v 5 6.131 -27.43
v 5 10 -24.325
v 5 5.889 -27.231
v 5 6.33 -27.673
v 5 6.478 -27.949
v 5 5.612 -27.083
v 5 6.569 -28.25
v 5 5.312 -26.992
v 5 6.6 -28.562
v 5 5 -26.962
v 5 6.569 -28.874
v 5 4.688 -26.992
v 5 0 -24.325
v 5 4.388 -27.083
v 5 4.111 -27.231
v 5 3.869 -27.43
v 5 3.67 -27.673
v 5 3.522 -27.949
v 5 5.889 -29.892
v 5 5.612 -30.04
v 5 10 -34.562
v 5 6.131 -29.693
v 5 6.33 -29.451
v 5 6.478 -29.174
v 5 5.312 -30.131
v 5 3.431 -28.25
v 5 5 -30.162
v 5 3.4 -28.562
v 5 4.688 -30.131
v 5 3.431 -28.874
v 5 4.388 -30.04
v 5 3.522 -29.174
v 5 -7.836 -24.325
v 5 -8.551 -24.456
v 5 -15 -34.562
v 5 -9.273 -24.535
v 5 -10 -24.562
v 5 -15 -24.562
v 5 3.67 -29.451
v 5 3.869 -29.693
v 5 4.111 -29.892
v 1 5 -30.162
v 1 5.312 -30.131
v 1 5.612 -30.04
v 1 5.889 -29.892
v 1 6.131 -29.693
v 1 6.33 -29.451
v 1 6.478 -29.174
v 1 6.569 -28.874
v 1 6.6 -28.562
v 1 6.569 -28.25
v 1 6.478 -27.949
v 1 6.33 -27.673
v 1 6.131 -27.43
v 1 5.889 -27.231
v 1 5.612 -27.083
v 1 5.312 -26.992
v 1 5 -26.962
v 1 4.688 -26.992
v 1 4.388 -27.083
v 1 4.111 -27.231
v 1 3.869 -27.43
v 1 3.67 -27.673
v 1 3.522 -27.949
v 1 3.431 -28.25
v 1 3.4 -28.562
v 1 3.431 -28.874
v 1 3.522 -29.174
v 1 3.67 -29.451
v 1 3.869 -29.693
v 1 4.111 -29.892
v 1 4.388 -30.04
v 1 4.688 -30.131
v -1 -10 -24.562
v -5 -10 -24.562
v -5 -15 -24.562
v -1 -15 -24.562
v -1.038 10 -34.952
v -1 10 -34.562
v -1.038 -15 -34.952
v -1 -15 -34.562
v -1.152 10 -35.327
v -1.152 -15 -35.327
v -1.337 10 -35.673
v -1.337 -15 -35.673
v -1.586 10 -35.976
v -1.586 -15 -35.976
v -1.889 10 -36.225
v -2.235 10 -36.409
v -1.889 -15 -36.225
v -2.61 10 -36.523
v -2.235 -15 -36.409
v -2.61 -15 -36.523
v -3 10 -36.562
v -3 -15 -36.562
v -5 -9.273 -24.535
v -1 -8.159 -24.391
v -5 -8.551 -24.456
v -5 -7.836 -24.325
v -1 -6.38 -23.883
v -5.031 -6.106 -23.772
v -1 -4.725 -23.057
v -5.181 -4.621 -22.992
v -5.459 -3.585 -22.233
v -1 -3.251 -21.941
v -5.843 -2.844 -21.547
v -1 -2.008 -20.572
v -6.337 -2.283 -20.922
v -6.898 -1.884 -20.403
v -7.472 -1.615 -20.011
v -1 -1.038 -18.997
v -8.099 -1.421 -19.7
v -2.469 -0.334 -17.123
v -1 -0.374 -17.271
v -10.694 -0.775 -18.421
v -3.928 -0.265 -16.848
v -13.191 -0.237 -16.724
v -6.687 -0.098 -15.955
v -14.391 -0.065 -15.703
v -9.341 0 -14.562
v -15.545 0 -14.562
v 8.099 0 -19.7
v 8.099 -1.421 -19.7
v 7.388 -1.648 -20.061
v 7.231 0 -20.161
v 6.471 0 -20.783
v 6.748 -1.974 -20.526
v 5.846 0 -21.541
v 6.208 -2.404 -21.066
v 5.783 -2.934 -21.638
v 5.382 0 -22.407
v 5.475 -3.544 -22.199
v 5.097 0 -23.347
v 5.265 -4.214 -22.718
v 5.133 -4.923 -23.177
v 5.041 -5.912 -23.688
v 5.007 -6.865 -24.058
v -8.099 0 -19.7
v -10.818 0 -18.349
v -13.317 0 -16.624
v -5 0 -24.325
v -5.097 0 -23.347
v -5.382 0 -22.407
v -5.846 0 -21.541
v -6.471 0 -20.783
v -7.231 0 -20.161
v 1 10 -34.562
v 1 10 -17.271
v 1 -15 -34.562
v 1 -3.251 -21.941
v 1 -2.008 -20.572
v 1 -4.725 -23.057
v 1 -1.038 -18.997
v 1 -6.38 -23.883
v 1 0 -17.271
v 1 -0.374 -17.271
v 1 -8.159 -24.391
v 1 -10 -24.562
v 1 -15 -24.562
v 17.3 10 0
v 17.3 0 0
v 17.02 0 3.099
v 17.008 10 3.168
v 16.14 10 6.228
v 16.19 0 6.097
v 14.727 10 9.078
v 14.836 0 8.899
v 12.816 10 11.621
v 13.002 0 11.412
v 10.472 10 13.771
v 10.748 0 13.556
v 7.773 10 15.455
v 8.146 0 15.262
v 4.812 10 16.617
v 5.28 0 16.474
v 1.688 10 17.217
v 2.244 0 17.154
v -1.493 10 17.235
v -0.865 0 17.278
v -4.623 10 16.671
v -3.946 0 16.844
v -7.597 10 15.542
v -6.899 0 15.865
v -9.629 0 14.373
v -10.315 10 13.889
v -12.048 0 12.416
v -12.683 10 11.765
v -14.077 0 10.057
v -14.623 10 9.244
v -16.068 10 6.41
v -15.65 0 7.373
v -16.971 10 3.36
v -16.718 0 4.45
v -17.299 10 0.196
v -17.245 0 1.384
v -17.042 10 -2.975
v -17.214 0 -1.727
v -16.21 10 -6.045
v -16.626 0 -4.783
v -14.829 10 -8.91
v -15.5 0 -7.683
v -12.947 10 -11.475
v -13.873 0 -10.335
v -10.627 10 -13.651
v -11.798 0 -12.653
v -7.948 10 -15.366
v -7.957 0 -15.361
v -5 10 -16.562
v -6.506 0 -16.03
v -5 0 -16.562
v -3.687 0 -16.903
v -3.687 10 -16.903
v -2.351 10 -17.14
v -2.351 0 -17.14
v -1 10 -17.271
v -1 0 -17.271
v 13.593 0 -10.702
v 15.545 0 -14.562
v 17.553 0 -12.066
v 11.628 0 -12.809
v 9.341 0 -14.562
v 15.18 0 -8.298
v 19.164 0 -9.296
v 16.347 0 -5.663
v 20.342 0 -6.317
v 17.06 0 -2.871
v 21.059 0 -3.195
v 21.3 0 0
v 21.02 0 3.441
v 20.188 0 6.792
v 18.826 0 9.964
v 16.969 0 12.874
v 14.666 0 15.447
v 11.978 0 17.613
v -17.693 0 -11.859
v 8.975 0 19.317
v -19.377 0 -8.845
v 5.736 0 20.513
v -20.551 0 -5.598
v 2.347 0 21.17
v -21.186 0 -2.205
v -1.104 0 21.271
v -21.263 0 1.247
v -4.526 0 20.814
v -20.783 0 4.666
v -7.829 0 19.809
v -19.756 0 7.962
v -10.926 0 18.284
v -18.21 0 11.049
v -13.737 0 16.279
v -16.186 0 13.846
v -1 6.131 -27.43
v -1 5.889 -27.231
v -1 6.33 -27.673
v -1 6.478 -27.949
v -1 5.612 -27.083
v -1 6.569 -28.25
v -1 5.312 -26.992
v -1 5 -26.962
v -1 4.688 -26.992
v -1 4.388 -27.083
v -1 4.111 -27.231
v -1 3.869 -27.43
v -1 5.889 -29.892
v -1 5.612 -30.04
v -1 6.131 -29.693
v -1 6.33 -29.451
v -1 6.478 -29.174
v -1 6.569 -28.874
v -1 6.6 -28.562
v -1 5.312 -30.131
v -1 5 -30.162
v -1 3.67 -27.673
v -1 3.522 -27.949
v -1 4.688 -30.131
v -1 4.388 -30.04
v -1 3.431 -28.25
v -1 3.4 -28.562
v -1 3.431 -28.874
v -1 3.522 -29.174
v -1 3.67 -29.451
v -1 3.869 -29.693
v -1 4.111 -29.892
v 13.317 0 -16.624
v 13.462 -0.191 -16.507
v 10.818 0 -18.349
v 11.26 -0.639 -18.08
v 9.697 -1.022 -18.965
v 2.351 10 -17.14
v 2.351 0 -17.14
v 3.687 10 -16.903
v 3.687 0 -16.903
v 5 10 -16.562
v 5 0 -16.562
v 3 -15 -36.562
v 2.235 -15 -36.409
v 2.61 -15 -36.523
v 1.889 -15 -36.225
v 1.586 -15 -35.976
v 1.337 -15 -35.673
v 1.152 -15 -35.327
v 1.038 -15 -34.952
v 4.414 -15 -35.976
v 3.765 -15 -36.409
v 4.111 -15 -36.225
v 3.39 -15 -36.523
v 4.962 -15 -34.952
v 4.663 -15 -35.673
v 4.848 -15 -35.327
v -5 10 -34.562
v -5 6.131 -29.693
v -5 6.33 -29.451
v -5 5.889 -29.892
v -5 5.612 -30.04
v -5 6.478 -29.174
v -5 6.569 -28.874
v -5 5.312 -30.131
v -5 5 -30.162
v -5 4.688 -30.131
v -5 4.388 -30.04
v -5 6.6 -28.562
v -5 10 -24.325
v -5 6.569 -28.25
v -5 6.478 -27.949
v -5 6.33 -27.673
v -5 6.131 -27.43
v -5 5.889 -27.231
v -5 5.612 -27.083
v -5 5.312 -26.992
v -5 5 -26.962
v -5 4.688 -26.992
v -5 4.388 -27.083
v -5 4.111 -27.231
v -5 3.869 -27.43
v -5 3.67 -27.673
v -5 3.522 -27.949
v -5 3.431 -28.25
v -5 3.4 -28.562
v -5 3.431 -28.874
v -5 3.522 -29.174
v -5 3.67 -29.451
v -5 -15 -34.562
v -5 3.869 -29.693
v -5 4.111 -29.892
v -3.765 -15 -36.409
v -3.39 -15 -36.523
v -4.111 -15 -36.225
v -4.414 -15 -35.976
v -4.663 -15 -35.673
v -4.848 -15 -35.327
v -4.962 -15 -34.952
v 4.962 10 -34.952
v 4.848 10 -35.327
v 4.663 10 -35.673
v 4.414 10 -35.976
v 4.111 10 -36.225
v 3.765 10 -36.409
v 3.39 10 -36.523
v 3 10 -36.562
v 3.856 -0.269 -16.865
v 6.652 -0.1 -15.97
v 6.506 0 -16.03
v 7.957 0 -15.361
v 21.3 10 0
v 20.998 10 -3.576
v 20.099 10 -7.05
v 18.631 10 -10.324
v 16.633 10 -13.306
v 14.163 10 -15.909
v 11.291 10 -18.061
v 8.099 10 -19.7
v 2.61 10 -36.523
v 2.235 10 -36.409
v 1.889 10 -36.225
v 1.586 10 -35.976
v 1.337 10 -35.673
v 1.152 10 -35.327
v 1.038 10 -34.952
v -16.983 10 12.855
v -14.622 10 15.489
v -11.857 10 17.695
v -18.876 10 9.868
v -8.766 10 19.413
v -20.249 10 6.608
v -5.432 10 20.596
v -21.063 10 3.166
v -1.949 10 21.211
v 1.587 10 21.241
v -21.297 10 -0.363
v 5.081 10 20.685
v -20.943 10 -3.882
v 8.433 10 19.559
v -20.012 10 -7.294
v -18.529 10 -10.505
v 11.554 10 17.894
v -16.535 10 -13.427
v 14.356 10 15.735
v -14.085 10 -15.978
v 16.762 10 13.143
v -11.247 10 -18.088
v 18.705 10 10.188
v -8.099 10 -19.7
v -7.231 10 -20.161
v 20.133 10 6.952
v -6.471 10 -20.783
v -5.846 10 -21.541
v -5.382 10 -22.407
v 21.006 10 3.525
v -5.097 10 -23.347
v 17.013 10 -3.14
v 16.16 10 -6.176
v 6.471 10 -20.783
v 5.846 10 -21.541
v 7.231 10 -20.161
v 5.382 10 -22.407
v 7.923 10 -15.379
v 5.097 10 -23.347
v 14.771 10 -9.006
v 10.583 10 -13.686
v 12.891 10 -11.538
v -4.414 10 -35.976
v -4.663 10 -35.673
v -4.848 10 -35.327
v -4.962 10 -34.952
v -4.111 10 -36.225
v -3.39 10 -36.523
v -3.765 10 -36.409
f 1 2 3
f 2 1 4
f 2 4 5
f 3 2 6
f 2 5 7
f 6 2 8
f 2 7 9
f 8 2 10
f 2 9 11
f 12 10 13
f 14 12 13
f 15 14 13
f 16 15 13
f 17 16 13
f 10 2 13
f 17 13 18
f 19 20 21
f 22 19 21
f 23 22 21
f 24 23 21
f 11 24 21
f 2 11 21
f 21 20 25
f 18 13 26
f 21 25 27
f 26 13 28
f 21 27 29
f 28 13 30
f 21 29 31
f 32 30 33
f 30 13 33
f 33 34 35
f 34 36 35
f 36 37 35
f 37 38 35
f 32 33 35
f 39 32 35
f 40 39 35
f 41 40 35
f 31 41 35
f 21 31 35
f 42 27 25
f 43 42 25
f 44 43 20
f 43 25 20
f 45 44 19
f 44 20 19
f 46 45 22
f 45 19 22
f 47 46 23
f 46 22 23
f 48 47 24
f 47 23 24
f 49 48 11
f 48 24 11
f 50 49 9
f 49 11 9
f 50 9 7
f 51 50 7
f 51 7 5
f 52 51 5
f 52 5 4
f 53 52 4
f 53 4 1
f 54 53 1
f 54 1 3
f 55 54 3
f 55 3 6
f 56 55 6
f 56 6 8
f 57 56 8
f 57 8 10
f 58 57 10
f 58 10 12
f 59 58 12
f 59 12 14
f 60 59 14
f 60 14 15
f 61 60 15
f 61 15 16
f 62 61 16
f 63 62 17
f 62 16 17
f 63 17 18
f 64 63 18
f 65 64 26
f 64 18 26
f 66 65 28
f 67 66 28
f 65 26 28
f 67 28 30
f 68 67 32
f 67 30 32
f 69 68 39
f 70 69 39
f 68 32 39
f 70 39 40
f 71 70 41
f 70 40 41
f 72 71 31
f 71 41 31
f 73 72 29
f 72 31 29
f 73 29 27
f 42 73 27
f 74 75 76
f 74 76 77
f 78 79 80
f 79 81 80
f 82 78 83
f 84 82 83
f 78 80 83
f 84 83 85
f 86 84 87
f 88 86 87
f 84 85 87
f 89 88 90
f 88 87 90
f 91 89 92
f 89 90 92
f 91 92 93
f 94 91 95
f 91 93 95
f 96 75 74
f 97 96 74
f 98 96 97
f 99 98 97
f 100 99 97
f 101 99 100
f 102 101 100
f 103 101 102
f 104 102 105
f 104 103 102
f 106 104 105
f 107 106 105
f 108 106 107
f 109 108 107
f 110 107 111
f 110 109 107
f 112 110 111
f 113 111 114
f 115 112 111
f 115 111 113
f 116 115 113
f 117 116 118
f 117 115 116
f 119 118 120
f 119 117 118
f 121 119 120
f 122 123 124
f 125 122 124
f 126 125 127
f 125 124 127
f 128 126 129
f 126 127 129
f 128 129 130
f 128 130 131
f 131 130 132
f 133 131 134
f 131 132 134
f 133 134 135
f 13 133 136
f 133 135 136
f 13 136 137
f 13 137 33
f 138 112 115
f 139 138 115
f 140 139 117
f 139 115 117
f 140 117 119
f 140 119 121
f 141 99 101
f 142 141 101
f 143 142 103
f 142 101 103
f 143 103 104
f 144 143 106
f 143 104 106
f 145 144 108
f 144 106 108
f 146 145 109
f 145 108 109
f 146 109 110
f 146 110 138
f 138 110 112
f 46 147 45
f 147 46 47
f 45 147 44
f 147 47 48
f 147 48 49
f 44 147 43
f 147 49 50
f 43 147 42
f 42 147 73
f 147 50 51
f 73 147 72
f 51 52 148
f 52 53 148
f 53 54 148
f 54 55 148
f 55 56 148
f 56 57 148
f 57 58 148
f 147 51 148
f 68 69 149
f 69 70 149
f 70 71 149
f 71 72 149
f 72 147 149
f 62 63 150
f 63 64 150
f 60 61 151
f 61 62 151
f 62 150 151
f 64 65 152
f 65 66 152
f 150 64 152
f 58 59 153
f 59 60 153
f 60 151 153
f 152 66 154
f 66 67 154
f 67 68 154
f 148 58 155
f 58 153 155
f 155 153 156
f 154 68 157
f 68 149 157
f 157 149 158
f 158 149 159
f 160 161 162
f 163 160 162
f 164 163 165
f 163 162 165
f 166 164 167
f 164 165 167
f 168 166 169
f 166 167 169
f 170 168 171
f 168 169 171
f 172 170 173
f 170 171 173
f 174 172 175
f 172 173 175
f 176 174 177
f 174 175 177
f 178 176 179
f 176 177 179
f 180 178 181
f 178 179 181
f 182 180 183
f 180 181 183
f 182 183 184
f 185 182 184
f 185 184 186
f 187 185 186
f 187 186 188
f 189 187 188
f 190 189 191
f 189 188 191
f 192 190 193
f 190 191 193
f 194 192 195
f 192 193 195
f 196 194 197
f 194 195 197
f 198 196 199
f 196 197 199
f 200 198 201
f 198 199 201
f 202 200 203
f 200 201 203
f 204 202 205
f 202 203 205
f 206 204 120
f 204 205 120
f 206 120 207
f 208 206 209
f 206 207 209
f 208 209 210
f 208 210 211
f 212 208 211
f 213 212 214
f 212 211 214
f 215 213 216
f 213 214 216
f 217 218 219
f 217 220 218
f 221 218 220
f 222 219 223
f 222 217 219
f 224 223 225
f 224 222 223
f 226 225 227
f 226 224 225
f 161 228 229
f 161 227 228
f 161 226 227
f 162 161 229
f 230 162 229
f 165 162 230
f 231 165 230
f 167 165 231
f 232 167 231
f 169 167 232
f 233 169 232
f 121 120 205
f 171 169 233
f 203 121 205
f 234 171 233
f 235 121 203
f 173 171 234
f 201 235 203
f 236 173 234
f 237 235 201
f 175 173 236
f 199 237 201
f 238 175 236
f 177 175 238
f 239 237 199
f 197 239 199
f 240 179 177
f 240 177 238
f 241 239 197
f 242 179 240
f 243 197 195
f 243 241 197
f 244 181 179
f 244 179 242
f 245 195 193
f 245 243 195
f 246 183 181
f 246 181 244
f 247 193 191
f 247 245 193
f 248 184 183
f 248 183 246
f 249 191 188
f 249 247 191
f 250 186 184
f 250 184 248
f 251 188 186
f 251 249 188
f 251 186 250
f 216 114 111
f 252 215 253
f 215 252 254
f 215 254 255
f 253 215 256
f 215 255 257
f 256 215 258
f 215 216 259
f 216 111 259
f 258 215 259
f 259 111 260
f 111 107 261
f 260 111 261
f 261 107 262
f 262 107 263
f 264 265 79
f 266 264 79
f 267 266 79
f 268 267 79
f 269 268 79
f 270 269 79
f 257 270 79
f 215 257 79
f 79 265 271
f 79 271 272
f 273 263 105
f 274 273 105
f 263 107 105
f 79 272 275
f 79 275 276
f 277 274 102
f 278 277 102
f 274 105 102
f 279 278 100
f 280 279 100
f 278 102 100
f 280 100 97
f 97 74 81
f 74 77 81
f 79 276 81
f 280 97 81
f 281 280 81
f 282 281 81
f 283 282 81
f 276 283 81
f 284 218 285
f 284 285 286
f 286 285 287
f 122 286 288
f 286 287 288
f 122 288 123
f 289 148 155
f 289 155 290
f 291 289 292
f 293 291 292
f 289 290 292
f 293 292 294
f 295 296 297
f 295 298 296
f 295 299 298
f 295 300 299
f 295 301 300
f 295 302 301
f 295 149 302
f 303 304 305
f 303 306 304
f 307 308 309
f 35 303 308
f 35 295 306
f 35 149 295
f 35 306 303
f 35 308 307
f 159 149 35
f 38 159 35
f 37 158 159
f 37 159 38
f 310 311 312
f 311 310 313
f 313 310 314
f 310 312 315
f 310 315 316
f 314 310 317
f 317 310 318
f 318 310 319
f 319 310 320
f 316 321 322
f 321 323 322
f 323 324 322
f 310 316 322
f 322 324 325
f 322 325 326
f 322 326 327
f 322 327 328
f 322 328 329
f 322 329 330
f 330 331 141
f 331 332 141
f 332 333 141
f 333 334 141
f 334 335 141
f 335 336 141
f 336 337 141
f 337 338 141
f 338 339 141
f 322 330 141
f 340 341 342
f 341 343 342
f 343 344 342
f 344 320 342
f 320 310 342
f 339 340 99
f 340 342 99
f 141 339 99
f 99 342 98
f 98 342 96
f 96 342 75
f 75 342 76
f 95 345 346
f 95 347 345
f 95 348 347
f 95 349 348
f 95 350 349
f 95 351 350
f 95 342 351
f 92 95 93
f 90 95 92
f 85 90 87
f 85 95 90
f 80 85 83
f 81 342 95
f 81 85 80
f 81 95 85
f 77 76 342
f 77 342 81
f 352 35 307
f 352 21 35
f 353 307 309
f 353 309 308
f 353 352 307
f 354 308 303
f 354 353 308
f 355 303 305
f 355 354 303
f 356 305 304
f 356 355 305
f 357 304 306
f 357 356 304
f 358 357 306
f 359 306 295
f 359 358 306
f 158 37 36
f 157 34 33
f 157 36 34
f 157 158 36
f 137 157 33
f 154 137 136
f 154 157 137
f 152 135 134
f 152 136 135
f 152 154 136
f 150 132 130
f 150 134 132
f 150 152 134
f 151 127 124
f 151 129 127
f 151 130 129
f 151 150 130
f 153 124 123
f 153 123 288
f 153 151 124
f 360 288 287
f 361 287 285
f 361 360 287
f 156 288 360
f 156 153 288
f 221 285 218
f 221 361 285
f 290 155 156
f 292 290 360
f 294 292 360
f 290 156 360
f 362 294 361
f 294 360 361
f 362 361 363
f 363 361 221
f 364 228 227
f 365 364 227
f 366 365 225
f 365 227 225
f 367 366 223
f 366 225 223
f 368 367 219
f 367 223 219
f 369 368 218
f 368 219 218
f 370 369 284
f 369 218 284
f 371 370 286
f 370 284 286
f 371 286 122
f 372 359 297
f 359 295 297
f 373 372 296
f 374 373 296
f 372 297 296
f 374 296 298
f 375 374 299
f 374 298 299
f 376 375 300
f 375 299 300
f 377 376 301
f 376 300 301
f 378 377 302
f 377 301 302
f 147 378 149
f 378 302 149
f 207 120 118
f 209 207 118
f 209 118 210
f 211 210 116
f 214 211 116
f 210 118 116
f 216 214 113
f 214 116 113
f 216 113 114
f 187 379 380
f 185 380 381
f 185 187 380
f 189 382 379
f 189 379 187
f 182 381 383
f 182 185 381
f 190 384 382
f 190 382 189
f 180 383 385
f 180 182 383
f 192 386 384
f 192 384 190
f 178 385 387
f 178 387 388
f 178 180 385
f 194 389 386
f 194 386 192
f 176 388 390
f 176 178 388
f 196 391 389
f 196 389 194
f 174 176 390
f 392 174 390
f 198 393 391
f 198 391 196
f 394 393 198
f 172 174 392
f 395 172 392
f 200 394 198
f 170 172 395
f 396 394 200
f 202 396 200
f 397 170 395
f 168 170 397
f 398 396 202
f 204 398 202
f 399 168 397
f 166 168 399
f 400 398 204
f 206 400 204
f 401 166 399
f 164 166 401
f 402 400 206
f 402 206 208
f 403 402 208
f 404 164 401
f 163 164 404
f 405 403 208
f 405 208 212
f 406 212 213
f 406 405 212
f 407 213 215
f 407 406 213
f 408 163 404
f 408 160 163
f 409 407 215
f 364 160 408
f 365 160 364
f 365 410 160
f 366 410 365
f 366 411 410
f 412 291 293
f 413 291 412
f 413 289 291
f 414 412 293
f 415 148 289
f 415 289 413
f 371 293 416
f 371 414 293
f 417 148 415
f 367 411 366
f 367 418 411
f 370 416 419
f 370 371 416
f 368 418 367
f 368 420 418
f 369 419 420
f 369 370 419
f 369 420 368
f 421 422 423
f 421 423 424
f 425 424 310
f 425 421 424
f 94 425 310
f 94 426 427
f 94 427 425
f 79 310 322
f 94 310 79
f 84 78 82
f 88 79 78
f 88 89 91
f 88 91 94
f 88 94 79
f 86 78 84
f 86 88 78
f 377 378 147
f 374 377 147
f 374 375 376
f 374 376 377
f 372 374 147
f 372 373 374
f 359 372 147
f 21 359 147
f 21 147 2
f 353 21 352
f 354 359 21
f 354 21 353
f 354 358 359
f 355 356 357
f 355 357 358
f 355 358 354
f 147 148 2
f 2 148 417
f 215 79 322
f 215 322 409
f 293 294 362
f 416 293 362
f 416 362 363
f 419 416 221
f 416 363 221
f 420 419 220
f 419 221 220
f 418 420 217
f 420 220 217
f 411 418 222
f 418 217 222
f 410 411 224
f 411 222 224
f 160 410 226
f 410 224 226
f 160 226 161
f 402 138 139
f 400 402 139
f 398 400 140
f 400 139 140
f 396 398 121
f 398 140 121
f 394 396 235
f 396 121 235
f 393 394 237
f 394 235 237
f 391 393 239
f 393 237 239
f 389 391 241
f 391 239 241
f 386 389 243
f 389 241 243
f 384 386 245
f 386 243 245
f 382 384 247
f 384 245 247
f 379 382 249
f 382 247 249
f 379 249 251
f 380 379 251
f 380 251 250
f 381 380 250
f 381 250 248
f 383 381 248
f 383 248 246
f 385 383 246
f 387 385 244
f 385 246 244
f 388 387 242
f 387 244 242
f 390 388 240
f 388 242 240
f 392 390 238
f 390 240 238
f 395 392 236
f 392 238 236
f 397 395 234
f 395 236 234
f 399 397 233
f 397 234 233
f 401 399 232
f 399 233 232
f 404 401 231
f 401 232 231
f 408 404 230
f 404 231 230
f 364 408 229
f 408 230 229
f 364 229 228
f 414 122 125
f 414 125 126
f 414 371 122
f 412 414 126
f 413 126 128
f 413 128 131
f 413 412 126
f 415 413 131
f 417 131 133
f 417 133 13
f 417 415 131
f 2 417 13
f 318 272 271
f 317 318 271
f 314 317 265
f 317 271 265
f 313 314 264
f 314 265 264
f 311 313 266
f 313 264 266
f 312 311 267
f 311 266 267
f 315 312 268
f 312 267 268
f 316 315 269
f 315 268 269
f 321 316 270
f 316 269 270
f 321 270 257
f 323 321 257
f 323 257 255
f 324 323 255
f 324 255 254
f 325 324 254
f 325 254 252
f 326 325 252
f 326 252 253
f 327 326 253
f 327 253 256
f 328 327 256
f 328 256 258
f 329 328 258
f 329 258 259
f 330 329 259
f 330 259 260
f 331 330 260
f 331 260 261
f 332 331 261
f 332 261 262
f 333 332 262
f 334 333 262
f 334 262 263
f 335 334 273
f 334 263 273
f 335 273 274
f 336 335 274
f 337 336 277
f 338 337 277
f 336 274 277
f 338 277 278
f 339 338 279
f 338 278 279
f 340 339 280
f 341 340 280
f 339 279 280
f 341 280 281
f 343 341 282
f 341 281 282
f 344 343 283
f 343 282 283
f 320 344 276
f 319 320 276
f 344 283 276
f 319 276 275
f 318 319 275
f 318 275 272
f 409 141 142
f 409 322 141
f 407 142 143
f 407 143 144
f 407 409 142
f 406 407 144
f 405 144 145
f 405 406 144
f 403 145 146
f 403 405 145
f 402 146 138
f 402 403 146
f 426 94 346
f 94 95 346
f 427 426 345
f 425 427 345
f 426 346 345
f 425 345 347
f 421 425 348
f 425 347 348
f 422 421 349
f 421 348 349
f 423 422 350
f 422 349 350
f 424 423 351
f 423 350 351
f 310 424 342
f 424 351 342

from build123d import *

# Parameters (mm, degrees)
BOSS_EXTRUDE4_DEPTH = 10
SKETCH6_R           = 1.6
CUT_EXTRUDE2_DEPTH  = 47.135107158
FILLET4_R           = 5
SKETCH7_W           = 4
SKETCH7_H           = 12
BOSS_EXTRUDE5_DEPTH = 15
FILLET5_START       = -10.0000001
FILLET5_DEPTH       = 10.0000001
FILLET5_START_2     = -22
FILLET5_2_DEPTH     = 44
FILLET6_R           = 2


with BuildPart() as part:
    # Sketch5 → Boss-Extrude4 (new body)
    with BuildSketch(Plane(origin=(0, 0, 0), x_dir=(1, 0, 0), z_dir=(0, 1, 0))):
        with BuildLine():
            ThreePointArc((17.3, 0), (-10.314795199, -13.888664443), (-5, 16.561702811))
            Line((-5, 16.561702811), (-5, 20.704830354))
            ThreePointArc((-5, 20.704830354), (-13.17554553, -16.736038958), (21.3, 0))
            ThreePointArc((21.3, 0), (16.736038958, 13.17554553), (5, 20.704830354))
            Line((5, 20.704830354), (5, 16.561702811))
            ThreePointArc((5, 16.561702811), (13.888664443, 10.314795199), (17.3, 0))
        make_face()
        with BuildLine():
            ThreePointArc((-5, 20.704830354), (-3.013586771, 21.085736761), (-1, 21.276512872))
            Line((-1, 21.276512872), (-1, 36.561702811))
            Line((-1, 36.561702811), (-5, 36.561702811))
            Line((-5, 36.561702811), (-5, 20.704830354))
        make_face()
        with BuildLine():
            ThreePointArc((-5, 16.561702811), (-3.020894222, 17.034206706), (-1, 17.271074084))
            Line((-1, 17.271074084), (-1, 21.276512872))
            ThreePointArc((-1, 21.276512872), (-3.013586771, 21.085736761), (-5, 20.704830354))
            Line((-5, 20.704830354), (-5, 16.561702811))
        make_face()
        with BuildLine():
            Line((1, 21.276512872), (1, 17.271074084))
            ThreePointArc((1, 17.271074084), (3.020894222, 17.034206706), (5, 16.561702811))
            Line((5, 16.561702811), (5, 20.704830354))
            ThreePointArc((5, 20.704830354), (3.013586771, 21.085736761), (1, 21.276512872))
        make_face()
        with BuildLine():
            Line((1, 36.561702811), (1, 21.276512872))
            ThreePointArc((1, 21.276512872), (3.013586771, 21.085736761), (5, 20.704830354))
            Line((5, 20.704830354), (5, 36.561702811))
            Line((5, 36.561702811), (1, 36.561702811))
        make_face()
    extrude(amount=BOSS_EXTRUDE4_DEPTH)

    # Sketch6 → Cut-Extrude2 (cut, through all)
    with BuildSketch(Plane(origin=(5, 0, 0), x_dir=(0, 0, -1), z_dir=(1, 0, 0))):
        with Locations((28.561702811, 5)):
            Circle(SKETCH6_R)
    extrude(amount=-CUT_EXTRUDE2_DEPTH, mode=Mode.SUBTRACT)

    # Fillet4
    fillet4_edges = [part.edges().sort_by_distance(p)[0] for p in [
        (5, 5, -20.704830354),
        (-5, 5, -20.704830354),
    ]]
    fillet(fillet4_edges, radius=FILLET4_R)

    # Sketch7 → Boss-Extrude5 (add)
    with BuildSketch(Plane.XZ):
        with Locations((-3, -30.561702811)):
            Rectangle(SKETCH7_W, SKETCH7_H)
        with Locations((3, -30.561702811)):
            Rectangle(SKETCH7_W, SKETCH7_H)
    extrude(amount=BOSS_EXTRUDE5_DEPTH)

    # Fillet5: read off the stored shape, not the designer's step
    # Fillet5 outline → Fillet5 (add)
    with BuildSketch(Plane(origin=(0, 0, 0), x_dir=(1, 0, 0), z_dir=(0, 1, 0)).offset(FILLET5_START)):
        with BuildLine():
            Line((-1, 17.271074084), (-1, 24.561702811))
            Line((-1, 24.561702811), (-5, 24.561702811))
            Line((-5, 24.561702811), (-5, 24.324678826))
            ThreePointArc((-5, 24.324678826), (-5.846344777, 21.541308874), (-8.098859316, 19.700215171))
            ThreePointArc((-8.098859316, 19.700215171), (0, -21.3), (8.098859316, 19.700215171))
            ThreePointArc((8.098859316, 19.700215171), (5.846344777, 21.541308874), (5, 24.324678826))
            Line((5, 24.324678826), (5, 24.561702811))
            Line((5, 24.561702811), (1, 24.561702811))
            Line((1, 24.561702811), (1, 17.271074084))
            ThreePointArc((1, 17.271074084), (0, -17.3), (-1, 17.271074084))
        make_face()
    extrude(amount=FILLET5_DEPTH)

    # Fillet5 2 outline → Fillet5 2 (cut)
    with BuildSketch(Plane.YZ.offset(FILLET5_START_2)):
        with BuildLine():
            ThreePointArc((-10, -24.561702811), (-2.928932188, -21.632770623), (0, -14.561702811))
            Line((0, -14.561702811), (0, 23))
            Line((0, 23), (-10.0000001, 23))
            Line((-10.0000001, 23), (-10, -24.561702811))
        make_face()
    extrude(amount=FILLET5_2_DEPTH, mode=Mode.SUBTRACT)

    # Fillet6
    fillet6_edges = [part.edges().sort_by_distance(p)[0] for p in [
        (5, -2.5, -36.561702811),
        (1, -2.5, -36.561702811),
        (-1, -2.5, -36.561702811),
        (-5, -2.5, -36.561702811),
    ]]
    fillet(fillet6_edges, radius=FILLET6_R - 0.0001)  # a hair under: the kernel refuses the full size


solid = part.part
